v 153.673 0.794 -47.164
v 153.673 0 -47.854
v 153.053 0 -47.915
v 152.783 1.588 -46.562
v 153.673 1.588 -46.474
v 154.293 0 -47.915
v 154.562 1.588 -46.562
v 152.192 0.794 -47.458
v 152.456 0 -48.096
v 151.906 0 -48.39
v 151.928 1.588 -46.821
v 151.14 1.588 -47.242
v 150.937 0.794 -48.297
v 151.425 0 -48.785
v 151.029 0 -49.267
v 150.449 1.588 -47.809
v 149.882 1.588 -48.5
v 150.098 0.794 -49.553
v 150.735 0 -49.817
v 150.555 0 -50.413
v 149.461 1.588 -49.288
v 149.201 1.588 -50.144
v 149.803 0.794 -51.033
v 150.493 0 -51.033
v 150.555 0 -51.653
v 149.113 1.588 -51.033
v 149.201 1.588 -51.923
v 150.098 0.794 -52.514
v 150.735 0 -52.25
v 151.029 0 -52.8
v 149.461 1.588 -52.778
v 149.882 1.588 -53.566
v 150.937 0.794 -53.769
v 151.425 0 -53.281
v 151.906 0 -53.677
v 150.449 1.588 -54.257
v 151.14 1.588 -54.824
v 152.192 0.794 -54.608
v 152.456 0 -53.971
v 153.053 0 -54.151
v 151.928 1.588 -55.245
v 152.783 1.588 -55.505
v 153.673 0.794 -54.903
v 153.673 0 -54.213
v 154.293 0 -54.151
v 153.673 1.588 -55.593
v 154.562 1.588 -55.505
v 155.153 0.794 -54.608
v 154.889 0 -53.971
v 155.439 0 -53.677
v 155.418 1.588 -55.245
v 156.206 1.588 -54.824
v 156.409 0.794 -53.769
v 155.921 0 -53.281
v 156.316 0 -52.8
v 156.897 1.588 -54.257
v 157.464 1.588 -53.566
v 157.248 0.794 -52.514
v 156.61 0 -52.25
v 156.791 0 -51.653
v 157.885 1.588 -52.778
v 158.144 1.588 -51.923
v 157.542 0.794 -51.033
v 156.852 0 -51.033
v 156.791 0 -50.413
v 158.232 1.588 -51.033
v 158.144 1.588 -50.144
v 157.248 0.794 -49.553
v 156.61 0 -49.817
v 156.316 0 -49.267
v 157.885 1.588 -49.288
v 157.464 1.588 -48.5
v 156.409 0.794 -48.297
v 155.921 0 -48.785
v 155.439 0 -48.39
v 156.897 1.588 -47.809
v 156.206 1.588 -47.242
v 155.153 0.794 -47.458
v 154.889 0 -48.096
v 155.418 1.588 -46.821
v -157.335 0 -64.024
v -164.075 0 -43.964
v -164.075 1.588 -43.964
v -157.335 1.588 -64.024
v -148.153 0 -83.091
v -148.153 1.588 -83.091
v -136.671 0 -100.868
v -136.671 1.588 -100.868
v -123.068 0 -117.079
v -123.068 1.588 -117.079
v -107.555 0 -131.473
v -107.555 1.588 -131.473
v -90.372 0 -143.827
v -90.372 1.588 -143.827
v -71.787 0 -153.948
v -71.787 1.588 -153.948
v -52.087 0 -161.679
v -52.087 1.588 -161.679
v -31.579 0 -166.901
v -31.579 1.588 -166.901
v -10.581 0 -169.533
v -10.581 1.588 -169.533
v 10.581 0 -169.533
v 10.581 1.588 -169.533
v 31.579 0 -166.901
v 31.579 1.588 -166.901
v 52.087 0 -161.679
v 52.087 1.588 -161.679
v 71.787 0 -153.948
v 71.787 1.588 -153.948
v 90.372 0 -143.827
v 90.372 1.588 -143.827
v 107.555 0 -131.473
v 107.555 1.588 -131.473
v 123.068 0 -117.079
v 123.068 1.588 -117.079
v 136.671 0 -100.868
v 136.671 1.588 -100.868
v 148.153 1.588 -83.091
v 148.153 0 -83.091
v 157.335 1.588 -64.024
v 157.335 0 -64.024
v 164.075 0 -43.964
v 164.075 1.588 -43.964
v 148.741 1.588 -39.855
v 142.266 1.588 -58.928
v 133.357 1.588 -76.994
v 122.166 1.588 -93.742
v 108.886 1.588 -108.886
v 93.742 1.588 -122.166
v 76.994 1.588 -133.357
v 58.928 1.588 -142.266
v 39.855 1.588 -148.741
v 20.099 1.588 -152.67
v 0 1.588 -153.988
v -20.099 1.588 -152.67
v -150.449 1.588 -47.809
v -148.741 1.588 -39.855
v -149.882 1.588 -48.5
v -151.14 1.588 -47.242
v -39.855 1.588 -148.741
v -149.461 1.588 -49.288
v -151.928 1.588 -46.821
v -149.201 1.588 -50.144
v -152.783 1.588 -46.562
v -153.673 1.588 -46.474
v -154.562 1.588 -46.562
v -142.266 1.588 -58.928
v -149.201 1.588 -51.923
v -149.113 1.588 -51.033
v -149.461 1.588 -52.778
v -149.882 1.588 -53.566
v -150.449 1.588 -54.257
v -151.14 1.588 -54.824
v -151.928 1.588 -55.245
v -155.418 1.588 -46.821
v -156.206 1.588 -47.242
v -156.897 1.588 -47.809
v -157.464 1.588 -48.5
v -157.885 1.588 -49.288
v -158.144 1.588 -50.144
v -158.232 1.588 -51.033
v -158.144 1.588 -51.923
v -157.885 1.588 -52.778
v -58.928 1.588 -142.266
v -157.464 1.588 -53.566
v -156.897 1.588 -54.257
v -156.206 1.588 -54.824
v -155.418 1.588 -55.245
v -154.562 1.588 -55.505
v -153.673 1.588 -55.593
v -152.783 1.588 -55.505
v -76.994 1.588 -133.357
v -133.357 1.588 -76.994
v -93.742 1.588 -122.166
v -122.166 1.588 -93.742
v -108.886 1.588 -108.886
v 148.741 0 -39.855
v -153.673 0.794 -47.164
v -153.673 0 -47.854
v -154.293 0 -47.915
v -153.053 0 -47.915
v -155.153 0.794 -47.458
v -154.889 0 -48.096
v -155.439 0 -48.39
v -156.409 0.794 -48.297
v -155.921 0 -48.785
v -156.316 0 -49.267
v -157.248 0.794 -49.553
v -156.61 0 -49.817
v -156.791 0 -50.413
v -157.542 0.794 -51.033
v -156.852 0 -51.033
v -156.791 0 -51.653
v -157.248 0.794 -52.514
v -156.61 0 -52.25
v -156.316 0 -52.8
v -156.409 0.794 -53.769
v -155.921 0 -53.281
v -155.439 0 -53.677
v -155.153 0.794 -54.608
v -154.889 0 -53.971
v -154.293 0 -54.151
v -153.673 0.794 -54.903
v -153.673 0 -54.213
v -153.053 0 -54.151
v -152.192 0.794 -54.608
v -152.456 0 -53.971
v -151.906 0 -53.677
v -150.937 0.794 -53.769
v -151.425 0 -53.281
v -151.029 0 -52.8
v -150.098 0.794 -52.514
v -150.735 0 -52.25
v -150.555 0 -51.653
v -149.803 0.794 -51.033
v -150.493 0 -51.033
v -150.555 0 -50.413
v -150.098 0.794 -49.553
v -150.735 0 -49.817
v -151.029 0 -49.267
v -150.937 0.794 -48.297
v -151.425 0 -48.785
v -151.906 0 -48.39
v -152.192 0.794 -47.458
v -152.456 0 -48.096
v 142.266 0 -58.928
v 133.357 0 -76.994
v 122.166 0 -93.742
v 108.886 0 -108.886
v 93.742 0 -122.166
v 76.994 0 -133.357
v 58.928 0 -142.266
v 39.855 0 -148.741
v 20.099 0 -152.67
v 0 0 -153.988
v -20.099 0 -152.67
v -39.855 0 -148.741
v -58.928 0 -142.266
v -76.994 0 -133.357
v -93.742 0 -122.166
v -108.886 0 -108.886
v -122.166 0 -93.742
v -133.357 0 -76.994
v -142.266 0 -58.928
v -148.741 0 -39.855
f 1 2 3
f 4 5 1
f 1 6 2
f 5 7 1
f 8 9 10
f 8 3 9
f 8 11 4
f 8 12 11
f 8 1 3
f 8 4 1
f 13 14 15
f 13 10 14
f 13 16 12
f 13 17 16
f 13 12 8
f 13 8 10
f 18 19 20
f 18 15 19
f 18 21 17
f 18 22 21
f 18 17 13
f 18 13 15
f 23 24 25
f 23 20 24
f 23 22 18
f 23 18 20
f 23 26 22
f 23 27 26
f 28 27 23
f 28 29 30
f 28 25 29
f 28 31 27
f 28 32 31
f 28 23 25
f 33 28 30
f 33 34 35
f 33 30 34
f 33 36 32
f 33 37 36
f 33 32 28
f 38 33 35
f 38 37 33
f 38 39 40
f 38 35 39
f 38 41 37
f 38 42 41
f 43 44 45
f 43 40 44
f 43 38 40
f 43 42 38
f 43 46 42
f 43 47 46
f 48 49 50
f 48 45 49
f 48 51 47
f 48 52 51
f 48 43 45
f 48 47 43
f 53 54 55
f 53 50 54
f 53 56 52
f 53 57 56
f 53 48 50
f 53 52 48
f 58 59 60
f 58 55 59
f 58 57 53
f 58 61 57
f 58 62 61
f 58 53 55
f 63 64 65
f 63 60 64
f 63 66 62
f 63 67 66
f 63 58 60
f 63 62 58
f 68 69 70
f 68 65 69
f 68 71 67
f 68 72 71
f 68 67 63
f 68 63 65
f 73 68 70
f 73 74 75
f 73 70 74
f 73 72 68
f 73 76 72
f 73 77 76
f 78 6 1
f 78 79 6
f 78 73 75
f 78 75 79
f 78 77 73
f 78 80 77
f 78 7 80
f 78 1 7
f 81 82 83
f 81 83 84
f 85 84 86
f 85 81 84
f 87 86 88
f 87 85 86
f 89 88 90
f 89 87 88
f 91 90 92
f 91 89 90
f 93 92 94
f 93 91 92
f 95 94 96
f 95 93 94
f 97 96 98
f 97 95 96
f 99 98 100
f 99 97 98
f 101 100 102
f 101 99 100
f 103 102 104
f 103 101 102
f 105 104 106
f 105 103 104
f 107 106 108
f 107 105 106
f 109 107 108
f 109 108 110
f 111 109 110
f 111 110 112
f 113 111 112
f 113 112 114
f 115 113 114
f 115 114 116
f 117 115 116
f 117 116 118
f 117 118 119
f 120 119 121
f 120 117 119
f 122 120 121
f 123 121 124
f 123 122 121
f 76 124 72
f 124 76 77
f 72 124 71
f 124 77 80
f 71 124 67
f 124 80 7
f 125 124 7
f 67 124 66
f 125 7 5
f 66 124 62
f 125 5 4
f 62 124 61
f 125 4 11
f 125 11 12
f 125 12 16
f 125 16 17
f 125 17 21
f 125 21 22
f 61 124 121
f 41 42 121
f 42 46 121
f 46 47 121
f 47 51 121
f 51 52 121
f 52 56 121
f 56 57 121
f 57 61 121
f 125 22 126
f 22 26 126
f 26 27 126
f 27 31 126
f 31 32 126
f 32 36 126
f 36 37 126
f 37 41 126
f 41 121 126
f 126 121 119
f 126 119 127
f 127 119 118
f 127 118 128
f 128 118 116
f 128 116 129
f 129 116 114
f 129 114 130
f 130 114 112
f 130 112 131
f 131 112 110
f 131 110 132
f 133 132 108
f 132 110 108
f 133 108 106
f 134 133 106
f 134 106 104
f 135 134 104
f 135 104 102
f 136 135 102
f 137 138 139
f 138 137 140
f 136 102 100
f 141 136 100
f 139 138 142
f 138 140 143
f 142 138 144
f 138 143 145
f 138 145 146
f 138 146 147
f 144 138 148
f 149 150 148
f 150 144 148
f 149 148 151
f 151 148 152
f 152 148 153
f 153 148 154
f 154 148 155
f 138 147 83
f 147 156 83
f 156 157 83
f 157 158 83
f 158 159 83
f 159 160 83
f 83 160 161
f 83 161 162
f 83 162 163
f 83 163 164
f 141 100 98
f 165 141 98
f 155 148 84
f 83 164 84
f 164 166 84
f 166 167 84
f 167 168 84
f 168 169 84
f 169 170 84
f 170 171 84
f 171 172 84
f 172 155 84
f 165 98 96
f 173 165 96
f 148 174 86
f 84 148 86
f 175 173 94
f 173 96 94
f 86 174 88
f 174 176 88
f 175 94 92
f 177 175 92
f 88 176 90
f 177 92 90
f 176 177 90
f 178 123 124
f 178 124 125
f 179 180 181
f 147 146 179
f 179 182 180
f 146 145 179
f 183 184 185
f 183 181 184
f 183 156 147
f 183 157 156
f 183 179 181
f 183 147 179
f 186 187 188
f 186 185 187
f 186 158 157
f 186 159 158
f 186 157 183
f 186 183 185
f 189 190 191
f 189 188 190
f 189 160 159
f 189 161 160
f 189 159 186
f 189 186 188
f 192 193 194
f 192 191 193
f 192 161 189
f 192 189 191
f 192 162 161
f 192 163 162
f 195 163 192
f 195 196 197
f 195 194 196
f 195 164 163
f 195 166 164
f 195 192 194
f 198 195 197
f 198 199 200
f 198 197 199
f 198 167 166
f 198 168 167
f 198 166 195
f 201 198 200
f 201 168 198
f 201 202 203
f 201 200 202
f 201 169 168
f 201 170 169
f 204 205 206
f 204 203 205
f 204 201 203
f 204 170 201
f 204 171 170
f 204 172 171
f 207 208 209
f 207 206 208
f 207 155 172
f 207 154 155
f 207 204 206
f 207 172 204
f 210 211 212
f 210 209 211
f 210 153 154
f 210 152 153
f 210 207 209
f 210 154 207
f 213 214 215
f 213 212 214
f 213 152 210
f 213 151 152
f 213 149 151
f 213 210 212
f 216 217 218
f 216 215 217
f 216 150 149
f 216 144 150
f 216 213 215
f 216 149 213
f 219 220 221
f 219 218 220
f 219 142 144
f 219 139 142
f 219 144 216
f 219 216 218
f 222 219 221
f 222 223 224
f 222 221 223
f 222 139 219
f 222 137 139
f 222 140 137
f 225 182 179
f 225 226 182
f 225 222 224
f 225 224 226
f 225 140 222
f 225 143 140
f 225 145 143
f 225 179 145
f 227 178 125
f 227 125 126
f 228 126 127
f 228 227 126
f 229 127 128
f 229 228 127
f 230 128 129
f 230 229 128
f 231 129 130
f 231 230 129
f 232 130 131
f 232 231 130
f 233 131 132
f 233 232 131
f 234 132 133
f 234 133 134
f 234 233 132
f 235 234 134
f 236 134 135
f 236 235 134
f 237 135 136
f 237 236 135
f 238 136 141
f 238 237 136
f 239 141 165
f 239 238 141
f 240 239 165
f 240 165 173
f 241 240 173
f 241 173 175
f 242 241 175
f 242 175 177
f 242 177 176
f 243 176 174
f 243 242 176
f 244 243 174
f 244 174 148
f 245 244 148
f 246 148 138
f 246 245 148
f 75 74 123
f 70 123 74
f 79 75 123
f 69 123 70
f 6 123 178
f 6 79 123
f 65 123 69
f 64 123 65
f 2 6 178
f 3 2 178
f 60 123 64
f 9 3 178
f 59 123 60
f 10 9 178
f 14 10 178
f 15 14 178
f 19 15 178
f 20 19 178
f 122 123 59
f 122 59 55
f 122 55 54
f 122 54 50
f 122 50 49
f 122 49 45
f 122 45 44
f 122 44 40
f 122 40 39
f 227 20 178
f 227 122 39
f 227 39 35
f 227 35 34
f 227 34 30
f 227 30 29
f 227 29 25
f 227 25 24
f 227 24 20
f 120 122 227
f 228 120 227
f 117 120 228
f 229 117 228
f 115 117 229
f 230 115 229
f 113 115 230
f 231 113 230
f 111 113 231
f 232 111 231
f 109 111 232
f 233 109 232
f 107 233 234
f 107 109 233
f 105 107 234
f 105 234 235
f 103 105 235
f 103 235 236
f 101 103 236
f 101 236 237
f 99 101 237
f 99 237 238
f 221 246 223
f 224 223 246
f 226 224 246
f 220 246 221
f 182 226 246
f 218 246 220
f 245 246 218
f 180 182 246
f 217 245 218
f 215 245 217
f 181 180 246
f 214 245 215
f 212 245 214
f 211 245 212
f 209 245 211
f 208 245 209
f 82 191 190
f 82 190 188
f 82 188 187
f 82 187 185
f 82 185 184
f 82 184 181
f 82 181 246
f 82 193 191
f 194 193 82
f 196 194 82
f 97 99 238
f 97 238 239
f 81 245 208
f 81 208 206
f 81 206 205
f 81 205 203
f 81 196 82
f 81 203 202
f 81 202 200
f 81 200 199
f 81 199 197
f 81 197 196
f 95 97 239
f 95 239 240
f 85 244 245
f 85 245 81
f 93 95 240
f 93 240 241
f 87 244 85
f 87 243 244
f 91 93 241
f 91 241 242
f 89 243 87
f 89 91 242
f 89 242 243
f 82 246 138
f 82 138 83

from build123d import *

# Parameters (mm, degrees)
BOSS_EXTRUDE1_DEPTH                           = 1.5875
CSK_FOR_8_FLAT_HEAD_SOCKET_CAP_SCREW1_A_COUNT = 2
CSK_FOR_8_FLAT_HEAD_SOCKET_CAP_SCREW1_A_PITCH = 307.345506508


with BuildPart() as part:
    # Sketch2 → Boss-Extrude1 (new body)
    with BuildSketch(Plane(origin=(0, 0, 0), x_dir=(1, 0, 0), z_dir=(0, 1, 0))):
        with BuildLine():
            Line((-148.740503176, 39.854897708), (-164.074575668, 43.963650049))
            ThreePointArc((-164.074575668, 43.963650049), (0, 169.8625), (164.074575668, 43.963650049))
            Line((164.074575668, 43.963650049), (148.740503176, 39.854897708))
            ThreePointArc((148.740503176, 39.854897708), (0, 153.9875), (-148.740503176, 39.854897708))
        make_face()
    extrude(amount=BOSS_EXTRUDE1_DEPTH)

    # Sketch4 → CSK for #8 Flat Head Socket Cap Screw1 (revolve, cut)
    with BuildSketch(Plane(origin=(-153.672753254, 1.5875, -51.033229688), x_dir=(0, 0, 1), z_dir=(1, 0, 0))):
        Polygon((0, 0), (0, 1.5875), (2.2479, 1.5875), (2.2479, 2.658961536), (4.5593, 0), align=None)
    csk_for_8_flat_head_socket_cap_screw1 = revolve(axis=Axis((-153.672753254, 7.9375, -51.033229688), (0, -1, 0)), mode=Mode.SUBTRACT)

    # CSK for #8 Flat Head Socket Cap Screw1 a: CSK for #8 Flat Head Socket Cap Screw1 ×2
    with Locations(*[(i * CSK_FOR_8_FLAT_HEAD_SOCKET_CAP_SCREW1_A_PITCH, 0, 0) for i in range(1, CSK_FOR_8_FLAT_HEAD_SOCKET_CAP_SCREW1_A_COUNT)]):
        add(csk_for_8_flat_head_socket_cap_screw1, mode=Mode.SUBTRACT)


solid = part.part
